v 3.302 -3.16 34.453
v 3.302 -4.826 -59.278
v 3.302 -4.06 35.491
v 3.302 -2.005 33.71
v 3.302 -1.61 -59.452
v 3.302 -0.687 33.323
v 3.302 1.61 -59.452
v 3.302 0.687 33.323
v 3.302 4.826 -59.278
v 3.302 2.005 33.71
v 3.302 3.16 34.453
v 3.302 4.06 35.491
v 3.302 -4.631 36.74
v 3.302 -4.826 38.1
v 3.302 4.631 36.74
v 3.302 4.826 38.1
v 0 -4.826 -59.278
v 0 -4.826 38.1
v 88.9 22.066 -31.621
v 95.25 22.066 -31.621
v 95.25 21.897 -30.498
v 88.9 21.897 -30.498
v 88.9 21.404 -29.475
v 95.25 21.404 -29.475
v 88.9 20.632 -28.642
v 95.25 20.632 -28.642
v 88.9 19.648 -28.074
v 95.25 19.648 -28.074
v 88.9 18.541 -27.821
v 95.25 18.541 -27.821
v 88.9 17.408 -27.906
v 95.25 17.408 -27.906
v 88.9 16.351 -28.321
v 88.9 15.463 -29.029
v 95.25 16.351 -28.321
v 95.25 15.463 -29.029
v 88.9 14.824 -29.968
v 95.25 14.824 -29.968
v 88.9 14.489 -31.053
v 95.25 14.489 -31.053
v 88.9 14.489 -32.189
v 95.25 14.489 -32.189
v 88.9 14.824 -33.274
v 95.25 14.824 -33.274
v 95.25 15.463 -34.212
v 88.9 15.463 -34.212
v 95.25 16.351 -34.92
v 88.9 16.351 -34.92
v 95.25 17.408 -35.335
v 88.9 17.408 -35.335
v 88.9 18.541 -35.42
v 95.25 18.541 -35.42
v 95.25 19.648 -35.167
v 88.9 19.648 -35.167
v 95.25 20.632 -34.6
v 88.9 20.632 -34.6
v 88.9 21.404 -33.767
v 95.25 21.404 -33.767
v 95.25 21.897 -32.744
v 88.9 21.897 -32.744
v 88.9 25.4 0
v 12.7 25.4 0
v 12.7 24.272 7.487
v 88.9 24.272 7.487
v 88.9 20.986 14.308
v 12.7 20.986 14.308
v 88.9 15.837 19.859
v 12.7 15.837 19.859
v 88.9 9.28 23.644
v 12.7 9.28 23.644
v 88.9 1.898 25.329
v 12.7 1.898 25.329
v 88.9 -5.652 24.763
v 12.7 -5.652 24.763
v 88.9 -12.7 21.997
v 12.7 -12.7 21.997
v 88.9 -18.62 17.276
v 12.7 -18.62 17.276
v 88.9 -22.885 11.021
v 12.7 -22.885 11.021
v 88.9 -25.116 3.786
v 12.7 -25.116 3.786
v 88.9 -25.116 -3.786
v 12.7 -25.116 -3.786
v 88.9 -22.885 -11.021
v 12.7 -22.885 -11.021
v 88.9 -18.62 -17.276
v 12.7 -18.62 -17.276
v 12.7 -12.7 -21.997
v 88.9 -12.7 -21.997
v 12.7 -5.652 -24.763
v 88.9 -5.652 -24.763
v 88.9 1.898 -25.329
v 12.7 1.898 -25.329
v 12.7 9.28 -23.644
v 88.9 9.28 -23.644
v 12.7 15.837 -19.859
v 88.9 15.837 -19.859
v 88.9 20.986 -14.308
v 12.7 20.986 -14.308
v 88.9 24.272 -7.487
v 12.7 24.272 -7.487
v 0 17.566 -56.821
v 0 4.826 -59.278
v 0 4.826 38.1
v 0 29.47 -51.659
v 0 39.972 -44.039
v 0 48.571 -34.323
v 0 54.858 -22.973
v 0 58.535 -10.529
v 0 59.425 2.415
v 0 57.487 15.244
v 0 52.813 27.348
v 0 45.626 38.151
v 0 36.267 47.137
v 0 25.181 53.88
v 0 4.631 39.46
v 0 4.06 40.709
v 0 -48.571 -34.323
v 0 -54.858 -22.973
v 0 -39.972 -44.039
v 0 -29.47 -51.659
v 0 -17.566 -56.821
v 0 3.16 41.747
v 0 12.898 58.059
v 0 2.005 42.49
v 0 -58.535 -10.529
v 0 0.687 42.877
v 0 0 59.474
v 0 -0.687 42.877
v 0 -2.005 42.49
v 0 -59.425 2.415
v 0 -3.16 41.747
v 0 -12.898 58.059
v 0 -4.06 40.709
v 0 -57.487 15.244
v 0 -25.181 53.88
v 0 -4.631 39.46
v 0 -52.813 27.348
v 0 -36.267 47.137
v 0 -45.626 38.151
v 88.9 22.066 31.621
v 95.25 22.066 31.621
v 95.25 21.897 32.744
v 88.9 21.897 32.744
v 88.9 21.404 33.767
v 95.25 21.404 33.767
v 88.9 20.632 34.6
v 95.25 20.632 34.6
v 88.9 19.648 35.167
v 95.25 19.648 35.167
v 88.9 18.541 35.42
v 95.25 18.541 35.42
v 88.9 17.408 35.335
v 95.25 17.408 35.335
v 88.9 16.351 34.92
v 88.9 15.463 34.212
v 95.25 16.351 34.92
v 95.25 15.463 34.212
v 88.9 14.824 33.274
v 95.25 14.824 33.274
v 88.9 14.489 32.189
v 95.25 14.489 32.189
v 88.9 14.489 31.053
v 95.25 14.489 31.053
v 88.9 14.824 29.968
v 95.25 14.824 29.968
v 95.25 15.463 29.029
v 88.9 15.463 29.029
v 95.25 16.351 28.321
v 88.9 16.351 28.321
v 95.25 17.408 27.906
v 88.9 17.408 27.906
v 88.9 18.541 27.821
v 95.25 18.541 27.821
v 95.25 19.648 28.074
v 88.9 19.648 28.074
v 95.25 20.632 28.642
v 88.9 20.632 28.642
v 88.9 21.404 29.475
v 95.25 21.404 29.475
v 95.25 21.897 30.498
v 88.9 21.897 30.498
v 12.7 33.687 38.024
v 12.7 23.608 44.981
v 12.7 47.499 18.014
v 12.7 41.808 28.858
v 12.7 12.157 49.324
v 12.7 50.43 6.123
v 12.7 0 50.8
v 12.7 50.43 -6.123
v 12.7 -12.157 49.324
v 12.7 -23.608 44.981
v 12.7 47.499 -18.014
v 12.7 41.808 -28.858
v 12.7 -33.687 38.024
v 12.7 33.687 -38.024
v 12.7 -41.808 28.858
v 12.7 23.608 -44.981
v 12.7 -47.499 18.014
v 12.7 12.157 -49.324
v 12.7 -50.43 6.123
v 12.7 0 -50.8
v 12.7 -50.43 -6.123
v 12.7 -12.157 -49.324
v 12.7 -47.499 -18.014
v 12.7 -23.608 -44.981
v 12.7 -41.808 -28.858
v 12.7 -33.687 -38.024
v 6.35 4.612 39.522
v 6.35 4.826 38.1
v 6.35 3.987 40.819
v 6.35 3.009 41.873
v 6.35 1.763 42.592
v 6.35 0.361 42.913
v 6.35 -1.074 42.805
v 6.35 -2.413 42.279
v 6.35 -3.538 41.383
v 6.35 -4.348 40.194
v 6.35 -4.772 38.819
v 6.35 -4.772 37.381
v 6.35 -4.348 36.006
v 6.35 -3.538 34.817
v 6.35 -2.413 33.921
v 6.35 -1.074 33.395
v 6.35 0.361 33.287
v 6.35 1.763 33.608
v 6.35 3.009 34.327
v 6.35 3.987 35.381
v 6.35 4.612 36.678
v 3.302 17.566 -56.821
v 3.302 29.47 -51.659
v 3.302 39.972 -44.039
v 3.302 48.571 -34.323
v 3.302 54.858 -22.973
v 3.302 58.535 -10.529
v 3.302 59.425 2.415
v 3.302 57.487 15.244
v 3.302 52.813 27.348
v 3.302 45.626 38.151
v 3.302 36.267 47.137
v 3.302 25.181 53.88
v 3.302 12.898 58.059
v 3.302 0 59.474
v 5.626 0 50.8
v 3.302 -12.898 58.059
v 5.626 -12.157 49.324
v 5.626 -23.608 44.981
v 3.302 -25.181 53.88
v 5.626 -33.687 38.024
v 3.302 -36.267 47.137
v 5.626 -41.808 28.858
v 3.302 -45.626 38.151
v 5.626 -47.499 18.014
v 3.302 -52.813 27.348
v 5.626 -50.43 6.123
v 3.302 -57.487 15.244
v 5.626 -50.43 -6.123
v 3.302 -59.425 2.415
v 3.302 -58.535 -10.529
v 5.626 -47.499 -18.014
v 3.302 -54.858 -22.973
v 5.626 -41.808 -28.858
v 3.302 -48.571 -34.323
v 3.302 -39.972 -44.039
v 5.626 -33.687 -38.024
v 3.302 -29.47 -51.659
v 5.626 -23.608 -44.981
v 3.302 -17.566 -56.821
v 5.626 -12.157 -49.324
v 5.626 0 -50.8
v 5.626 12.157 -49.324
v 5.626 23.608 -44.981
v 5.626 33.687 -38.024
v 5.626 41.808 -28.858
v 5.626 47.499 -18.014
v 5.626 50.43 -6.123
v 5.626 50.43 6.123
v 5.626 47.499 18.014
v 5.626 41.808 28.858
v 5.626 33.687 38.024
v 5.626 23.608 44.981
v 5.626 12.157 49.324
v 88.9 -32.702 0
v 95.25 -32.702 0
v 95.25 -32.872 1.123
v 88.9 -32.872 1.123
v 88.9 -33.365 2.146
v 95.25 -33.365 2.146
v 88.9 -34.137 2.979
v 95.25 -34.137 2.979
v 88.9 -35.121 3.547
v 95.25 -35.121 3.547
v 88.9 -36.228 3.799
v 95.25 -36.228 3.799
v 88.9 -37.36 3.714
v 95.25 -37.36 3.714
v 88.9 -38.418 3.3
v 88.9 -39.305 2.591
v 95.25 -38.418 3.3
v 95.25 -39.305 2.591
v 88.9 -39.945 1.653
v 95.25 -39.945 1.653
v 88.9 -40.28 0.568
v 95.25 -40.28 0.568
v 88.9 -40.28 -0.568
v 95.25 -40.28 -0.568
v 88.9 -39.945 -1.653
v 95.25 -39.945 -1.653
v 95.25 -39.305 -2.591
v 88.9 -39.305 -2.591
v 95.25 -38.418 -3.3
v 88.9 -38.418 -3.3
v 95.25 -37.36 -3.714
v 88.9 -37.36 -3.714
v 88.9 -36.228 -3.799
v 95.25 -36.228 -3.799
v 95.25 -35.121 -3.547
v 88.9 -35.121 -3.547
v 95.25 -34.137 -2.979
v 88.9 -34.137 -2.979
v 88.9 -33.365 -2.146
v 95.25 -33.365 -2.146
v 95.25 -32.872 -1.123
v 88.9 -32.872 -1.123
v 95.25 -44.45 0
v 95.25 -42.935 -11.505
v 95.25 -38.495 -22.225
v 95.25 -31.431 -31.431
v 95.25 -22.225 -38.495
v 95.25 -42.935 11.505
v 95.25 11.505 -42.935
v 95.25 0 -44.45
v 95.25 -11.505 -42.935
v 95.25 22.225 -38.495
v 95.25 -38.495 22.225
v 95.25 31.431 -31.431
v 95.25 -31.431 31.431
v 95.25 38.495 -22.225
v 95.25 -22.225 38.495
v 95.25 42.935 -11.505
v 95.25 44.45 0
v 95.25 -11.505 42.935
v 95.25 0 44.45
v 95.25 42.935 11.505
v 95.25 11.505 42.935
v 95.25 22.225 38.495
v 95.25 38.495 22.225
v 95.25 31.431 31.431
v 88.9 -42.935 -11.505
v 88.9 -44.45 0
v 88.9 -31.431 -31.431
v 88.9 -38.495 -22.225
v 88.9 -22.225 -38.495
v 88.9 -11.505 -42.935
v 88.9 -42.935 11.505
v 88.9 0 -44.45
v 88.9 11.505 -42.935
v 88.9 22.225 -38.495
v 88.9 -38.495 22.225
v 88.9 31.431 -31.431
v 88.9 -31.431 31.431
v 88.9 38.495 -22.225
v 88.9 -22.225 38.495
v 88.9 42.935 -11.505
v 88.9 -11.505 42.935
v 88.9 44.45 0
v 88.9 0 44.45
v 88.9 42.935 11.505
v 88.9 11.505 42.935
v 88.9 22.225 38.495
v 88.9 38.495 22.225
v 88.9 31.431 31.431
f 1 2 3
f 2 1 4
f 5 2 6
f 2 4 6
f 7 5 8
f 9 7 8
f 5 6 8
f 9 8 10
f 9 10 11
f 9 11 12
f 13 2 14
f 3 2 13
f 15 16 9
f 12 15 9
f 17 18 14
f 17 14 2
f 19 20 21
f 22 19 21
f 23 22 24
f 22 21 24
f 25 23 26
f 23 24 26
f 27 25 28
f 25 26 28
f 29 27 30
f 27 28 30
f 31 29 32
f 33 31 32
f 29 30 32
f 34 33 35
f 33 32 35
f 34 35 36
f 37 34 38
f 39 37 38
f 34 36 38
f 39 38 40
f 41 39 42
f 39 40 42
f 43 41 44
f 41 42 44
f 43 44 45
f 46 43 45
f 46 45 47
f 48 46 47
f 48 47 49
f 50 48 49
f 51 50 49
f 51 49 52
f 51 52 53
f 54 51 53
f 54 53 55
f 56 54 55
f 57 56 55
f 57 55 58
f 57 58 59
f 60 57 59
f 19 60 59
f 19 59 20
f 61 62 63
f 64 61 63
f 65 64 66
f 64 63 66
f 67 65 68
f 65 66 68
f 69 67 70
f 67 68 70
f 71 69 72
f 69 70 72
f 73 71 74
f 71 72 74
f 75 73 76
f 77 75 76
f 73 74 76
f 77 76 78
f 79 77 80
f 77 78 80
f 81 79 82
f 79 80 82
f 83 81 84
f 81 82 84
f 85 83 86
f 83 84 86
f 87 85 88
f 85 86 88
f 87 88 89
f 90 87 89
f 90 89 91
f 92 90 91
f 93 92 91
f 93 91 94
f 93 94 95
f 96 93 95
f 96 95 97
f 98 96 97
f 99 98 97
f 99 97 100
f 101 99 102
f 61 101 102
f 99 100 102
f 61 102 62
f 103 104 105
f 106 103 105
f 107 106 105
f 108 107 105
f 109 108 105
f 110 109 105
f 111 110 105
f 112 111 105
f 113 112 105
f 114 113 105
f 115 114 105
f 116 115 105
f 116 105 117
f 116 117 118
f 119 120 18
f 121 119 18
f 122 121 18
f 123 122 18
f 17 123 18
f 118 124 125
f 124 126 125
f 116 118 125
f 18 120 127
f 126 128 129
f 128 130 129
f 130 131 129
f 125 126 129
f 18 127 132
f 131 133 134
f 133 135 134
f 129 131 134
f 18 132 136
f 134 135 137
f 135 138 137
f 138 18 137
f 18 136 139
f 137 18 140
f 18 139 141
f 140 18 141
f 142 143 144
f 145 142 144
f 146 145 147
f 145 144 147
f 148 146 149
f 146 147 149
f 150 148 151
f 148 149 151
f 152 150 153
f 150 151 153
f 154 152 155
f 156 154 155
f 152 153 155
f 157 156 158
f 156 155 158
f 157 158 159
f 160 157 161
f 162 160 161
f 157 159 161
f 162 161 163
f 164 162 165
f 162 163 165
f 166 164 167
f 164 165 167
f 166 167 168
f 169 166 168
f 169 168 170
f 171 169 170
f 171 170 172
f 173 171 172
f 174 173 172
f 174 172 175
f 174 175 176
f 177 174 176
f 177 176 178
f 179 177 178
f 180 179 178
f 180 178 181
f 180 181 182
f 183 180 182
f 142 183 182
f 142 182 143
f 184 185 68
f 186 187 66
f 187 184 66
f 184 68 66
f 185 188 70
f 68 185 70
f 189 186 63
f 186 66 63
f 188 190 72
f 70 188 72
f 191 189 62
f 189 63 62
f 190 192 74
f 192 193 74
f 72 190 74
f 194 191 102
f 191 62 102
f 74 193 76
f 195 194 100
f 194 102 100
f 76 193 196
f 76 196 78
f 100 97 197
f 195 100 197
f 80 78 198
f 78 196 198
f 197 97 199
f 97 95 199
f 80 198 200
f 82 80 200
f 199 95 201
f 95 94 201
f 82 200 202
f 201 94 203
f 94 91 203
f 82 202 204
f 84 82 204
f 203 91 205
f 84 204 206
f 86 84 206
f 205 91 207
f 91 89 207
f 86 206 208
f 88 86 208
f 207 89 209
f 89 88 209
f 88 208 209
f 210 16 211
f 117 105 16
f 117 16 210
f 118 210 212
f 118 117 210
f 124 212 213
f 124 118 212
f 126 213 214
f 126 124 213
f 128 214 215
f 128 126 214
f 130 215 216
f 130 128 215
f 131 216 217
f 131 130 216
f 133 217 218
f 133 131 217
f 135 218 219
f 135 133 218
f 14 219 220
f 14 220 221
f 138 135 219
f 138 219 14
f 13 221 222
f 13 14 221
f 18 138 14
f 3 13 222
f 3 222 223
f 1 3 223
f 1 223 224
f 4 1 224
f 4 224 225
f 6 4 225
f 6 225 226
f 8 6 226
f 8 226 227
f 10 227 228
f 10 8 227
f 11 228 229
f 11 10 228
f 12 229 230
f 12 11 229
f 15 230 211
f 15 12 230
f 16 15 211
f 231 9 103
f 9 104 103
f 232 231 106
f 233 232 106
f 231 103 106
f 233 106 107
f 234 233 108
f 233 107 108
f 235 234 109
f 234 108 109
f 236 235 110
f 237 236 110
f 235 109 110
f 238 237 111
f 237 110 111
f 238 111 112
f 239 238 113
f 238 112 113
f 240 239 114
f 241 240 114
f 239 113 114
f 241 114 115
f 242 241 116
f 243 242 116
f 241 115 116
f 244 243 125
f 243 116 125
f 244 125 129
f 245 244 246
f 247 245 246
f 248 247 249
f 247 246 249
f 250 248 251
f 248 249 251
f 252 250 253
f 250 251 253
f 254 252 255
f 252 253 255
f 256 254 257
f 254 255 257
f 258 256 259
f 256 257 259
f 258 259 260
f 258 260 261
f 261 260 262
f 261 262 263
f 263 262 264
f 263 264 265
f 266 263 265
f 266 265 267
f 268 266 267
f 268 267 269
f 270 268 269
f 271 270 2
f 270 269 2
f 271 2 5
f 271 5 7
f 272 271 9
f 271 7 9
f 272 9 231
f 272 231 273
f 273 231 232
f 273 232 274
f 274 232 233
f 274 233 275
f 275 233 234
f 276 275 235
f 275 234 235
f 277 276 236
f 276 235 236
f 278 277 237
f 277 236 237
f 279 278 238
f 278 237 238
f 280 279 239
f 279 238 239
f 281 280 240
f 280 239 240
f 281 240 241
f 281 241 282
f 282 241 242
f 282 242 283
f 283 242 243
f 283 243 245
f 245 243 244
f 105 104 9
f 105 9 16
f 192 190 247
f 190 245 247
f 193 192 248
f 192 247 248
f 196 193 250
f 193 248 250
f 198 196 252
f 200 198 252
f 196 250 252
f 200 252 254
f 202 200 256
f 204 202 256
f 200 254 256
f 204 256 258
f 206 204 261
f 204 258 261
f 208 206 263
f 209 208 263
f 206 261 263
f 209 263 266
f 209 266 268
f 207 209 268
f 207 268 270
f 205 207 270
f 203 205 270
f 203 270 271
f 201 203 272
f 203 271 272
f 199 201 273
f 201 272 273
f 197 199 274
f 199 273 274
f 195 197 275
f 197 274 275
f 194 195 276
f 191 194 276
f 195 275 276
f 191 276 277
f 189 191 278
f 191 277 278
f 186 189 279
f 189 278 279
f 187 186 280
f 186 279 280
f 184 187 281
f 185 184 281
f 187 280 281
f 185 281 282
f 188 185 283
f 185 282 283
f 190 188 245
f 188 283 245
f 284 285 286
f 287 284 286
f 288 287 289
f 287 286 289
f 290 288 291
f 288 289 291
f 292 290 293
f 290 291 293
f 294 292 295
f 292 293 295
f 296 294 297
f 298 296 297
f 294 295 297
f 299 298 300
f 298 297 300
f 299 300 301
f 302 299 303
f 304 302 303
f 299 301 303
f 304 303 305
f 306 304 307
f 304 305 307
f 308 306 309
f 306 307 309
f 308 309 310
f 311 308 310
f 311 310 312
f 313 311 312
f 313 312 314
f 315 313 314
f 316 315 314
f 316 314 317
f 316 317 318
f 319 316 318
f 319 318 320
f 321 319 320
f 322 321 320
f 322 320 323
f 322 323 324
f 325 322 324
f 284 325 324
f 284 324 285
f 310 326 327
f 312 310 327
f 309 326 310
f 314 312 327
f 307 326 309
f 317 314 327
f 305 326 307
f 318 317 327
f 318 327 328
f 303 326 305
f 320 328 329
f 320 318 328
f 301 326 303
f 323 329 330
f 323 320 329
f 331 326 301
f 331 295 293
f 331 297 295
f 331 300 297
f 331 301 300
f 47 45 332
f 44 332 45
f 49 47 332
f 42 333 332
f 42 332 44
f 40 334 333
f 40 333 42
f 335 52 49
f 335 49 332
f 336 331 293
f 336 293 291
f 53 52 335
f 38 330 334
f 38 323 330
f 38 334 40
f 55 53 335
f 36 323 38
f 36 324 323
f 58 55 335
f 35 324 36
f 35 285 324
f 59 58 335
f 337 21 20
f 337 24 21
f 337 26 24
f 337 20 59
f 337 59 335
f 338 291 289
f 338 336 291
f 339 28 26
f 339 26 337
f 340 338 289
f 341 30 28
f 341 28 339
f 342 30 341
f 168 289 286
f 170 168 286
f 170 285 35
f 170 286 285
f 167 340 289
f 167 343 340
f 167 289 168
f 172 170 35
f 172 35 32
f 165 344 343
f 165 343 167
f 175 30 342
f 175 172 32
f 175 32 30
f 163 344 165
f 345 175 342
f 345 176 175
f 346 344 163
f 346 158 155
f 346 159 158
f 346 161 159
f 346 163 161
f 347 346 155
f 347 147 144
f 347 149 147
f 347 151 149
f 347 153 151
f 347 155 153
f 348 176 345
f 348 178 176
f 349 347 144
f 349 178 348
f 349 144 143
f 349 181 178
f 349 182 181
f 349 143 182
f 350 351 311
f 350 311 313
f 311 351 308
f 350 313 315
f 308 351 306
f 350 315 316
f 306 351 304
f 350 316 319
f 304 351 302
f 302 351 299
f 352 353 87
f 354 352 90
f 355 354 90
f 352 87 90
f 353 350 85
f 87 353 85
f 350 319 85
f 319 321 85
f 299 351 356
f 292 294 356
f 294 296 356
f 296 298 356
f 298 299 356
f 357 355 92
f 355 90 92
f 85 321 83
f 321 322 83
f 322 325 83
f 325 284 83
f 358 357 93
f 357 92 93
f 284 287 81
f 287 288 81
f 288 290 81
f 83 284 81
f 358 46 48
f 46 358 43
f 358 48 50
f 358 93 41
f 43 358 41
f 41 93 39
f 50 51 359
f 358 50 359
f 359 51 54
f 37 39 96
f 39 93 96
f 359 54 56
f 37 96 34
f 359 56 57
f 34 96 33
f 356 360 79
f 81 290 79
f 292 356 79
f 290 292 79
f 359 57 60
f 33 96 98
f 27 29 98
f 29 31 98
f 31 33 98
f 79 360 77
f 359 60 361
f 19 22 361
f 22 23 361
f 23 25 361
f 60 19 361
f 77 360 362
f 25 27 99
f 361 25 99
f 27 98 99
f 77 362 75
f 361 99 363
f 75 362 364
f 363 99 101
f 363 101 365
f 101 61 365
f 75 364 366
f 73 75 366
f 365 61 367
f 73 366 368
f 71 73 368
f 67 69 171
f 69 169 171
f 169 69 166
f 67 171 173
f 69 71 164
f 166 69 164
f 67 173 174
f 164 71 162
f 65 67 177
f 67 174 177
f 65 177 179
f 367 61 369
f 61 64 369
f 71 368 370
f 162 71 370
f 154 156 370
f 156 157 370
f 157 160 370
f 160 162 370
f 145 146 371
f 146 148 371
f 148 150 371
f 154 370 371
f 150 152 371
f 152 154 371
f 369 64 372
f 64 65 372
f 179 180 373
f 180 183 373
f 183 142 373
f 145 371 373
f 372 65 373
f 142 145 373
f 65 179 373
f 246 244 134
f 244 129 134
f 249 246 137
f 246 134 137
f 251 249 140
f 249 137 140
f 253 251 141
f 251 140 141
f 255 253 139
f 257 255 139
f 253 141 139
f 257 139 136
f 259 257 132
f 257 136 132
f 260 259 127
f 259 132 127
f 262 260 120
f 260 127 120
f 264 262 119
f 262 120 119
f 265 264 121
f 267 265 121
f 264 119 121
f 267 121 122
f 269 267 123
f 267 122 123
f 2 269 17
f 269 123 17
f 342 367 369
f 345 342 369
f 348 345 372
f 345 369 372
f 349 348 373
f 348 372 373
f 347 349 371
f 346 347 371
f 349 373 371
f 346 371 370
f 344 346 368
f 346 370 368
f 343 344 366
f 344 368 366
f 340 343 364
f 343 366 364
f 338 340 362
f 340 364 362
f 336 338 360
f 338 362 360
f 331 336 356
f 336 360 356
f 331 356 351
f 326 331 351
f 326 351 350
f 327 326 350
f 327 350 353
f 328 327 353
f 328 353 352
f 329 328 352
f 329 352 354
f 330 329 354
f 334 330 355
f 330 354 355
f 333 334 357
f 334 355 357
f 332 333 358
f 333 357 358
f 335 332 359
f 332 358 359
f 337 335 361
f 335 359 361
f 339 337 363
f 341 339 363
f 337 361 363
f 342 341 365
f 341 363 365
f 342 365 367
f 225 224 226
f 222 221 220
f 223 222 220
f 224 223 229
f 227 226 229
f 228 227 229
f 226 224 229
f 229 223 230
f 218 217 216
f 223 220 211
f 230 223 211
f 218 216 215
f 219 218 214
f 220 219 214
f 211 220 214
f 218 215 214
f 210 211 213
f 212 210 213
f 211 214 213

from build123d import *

# Parameters (mm, degrees)
F3_DEPTH  = 3.302
F4_R      = 4.826
F5_DEPTH  = 6.35
F6_R      = 25.4
F7_DEPTH  = 76.2
F8_R      = 44.45
F9_DEPTH  = 6.35
F10_R     = 3.81
F11_DEPTH = 25.4


with BuildPart() as f1:
    # F0 (on Front) → F1 (revolve)
    with BuildSketch(Plane.XZ):
        Polygon((0, 59.4741), (0, 0), (12.7, 0), (12.7, 50.8), (5.626218, 50.8), (3.302, 59.4741), align=None)
    revolve(axis=Axis((-7.589792, 0, 0), (1, 0, 0)))

    # F2 (on Right) → F3 (cut)
    with BuildSketch(Plane.YZ):
        with BuildLine():
            Line((4.826, -62.648721), (4.826, 38.1))
            ThreePointArc((4.826, 38.1), (0, 42.926), (-4.826, 38.1))
            Line((-4.826, 38.1), (-4.826, -62.648721))
            Line((-4.826, -62.648721), (4.826, -62.648721))
        make_face()
    extrude(amount=F3_DEPTH, mode=Mode.SUBTRACT)

    # F4 (on Right) → F5 (cut)
    with BuildSketch(Plane.YZ):
        with Locations((0, 38.1)):
            Circle(F4_R)
    extrude(amount=F5_DEPTH, mode=Mode.SUBTRACT)

    # F6 (on face) → F7 (join)
    with BuildSketch(Plane.YZ.offset(12.7)):
        Circle(F6_R)
    extrude(amount=F7_DEPTH)

    # F8 (on face) → F9 (join)
    with BuildSketch(Plane.YZ.offset(88.9)):
        Circle(F8_R)
    extrude(amount=F9_DEPTH)

    # F10 (on face) → F11 (cut)
    with BuildSketch(Plane.YZ.offset(95.25)):
        with Locations((-36.5125, 0)):
            Circle(F10_R)
        with Locations((18.25625, -31.620753)):
            Circle(F10_R)
        with Locations((18.25625, 31.620753)):
            Circle(F10_R)
    extrude(amount=-F11_DEPTH, mode=Mode.SUBTRACT)


solid = f1.part
